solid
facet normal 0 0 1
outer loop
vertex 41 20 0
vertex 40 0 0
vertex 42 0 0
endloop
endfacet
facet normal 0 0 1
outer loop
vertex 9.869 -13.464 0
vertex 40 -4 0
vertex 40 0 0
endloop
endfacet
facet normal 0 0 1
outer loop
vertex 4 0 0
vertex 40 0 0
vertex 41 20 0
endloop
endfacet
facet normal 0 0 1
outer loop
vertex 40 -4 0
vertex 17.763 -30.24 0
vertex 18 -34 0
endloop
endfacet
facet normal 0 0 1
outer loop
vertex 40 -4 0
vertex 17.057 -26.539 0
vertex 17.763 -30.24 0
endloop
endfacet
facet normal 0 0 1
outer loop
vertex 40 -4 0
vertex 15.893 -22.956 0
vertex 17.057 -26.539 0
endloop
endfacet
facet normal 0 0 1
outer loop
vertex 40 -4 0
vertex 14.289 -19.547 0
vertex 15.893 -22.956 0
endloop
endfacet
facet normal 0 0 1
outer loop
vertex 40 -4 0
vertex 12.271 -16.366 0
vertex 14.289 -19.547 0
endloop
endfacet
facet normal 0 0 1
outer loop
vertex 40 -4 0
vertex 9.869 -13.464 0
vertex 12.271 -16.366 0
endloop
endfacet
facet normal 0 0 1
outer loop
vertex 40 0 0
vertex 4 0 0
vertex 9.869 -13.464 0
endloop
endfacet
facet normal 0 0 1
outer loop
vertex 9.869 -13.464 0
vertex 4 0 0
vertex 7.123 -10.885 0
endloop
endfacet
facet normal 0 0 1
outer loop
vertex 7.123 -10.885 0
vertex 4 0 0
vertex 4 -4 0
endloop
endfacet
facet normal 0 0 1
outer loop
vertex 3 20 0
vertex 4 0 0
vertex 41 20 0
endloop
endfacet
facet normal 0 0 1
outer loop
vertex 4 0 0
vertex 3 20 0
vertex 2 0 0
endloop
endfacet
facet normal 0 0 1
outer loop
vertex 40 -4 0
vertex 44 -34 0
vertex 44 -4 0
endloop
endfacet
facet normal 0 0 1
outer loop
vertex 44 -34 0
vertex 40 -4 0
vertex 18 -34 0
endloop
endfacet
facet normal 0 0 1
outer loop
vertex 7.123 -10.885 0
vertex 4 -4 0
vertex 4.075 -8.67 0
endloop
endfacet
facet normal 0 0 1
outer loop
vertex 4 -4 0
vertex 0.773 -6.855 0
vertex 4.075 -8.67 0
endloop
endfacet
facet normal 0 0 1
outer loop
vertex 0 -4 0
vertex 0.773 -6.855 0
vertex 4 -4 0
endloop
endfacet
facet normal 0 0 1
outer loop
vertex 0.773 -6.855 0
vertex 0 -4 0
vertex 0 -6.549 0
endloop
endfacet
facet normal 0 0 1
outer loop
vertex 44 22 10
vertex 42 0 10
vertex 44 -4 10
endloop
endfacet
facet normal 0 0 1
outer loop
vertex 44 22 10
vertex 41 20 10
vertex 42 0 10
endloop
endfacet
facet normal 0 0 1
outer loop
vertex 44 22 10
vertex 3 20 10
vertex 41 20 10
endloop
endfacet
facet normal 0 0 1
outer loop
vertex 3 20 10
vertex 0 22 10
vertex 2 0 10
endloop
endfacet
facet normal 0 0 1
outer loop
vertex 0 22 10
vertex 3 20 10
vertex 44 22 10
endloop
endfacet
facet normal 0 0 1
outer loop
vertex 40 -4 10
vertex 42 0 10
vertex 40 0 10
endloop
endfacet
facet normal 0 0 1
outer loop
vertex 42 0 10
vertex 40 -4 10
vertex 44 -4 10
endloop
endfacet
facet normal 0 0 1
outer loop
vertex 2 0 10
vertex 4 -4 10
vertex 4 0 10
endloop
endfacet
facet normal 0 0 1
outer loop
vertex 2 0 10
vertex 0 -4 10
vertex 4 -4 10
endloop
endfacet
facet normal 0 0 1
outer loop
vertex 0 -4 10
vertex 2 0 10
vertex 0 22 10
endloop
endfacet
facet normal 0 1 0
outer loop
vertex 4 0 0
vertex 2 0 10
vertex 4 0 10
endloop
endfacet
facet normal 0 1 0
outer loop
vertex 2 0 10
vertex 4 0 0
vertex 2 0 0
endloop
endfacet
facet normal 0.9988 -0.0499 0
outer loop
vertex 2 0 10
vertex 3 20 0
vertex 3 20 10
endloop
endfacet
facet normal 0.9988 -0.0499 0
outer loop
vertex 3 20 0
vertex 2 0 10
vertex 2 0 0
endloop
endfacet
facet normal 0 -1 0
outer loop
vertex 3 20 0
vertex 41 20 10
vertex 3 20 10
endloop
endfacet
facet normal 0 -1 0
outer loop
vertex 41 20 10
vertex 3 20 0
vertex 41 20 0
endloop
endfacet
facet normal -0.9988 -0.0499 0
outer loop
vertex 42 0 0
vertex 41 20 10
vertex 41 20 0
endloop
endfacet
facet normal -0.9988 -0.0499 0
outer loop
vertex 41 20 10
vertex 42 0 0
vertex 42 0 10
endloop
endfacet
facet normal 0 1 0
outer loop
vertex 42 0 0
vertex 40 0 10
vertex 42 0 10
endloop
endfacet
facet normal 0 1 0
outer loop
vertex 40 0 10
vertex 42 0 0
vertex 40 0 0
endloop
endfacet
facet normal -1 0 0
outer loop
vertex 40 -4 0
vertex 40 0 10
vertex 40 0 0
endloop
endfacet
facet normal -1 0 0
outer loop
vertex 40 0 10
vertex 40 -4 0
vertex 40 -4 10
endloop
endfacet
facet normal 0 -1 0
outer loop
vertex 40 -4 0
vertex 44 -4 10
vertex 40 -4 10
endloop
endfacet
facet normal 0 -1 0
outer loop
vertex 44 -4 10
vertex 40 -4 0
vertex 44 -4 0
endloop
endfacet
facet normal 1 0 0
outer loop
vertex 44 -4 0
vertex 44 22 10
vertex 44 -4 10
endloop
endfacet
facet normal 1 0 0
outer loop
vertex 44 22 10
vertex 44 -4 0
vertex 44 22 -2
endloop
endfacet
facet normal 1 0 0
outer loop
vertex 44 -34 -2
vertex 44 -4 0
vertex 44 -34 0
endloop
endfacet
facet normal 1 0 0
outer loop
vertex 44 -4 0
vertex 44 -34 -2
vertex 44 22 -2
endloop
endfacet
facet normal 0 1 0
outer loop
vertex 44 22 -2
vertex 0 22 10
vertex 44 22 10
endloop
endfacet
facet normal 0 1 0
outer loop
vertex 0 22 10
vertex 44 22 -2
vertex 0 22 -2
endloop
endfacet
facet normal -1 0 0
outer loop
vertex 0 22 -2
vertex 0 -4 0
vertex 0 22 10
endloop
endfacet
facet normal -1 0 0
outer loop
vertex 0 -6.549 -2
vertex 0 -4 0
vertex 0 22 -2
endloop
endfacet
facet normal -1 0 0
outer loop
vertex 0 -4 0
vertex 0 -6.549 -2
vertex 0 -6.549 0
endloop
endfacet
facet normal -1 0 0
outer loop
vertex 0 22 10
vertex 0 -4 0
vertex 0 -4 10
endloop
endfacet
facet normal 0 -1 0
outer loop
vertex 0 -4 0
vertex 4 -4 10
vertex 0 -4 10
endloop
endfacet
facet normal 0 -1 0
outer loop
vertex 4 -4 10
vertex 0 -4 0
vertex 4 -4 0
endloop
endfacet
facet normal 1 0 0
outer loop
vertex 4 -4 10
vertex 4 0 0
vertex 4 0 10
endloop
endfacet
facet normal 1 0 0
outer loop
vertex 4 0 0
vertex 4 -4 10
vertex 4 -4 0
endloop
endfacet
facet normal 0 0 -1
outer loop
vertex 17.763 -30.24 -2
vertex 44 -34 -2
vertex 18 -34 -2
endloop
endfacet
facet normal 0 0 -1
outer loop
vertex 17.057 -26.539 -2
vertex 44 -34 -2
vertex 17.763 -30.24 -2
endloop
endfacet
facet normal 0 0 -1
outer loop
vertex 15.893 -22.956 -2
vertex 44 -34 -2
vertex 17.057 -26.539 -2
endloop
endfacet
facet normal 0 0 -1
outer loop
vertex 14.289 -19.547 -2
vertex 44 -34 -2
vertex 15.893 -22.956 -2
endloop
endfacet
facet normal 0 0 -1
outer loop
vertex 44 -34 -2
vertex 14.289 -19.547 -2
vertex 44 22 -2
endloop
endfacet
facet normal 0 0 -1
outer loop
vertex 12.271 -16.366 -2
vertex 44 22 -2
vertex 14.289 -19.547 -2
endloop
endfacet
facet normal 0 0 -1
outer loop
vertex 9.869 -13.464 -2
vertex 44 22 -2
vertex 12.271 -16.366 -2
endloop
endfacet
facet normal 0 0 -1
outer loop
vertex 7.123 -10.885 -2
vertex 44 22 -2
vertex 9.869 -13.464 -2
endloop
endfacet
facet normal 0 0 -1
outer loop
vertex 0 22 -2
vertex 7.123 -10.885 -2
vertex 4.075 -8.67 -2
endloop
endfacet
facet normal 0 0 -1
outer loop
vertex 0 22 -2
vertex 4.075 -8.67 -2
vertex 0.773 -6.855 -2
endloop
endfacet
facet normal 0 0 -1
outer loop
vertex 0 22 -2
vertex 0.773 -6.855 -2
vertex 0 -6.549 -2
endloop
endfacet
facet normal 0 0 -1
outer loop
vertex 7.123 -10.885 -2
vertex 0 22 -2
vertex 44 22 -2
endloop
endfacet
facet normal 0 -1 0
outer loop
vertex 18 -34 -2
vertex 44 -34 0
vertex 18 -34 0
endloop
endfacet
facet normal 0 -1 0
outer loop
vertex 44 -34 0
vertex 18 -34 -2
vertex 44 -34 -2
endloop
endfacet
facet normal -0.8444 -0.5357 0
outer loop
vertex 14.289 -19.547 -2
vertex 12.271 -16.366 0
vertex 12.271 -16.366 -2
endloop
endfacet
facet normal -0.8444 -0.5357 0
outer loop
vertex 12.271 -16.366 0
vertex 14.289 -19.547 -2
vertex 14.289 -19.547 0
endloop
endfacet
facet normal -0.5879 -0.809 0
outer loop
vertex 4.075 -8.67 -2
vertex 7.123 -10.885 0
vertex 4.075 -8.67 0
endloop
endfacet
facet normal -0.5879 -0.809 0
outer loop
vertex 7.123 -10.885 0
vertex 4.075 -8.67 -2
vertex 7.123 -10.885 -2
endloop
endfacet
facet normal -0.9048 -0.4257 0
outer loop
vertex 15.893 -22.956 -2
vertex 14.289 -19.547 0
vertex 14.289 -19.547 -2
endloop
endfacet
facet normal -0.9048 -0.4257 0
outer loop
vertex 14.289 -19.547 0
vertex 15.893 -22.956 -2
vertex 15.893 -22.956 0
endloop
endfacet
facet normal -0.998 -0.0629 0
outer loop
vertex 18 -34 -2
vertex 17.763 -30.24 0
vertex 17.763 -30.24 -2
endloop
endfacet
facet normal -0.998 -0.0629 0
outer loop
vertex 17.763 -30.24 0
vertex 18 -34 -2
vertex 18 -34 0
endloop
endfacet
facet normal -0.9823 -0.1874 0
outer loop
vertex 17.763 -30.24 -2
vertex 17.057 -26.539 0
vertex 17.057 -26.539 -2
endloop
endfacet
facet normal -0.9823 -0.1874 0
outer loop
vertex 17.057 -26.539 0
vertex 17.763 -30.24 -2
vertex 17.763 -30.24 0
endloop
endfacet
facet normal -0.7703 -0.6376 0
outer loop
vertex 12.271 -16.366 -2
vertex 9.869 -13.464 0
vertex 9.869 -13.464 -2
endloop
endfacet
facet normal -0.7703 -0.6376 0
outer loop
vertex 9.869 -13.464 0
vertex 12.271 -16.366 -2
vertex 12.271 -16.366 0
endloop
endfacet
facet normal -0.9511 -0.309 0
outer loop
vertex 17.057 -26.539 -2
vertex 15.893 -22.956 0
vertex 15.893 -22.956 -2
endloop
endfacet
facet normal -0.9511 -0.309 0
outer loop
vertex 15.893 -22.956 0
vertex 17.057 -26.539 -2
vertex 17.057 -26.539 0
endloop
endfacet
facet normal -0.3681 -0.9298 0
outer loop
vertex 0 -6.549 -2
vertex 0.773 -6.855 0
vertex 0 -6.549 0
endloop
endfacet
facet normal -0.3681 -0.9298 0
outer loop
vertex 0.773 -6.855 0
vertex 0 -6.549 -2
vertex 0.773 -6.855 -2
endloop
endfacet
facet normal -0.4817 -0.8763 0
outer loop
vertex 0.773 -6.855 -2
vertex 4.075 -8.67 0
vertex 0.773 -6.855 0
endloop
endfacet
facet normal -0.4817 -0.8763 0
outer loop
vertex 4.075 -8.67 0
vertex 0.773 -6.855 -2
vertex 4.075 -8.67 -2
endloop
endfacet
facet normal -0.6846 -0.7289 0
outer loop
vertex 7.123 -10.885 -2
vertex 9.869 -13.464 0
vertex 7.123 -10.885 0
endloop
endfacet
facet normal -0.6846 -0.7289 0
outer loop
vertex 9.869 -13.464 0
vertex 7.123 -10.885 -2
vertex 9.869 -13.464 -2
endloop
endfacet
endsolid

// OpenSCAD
$fn=50;
w = 2; // wall

difference() {
	union() {
		linear_extrude(height=10)
			polygon([[0,-4],[0,20+w],[40+2*w,20+w],[40+2*w,-4],[40+w-2,-4],[40+w-2,0],[40+w,0],[40-1+w,20],[w+1,20],[w,0],[w+2,0],[w+2,-4]]);
		translate([0,-34,-w])cube([40+2*w,34+20+w,w]);
	}
	translate([-12,-34,-2*w]) 
		cylinder(r=30, h=3*w);
}
